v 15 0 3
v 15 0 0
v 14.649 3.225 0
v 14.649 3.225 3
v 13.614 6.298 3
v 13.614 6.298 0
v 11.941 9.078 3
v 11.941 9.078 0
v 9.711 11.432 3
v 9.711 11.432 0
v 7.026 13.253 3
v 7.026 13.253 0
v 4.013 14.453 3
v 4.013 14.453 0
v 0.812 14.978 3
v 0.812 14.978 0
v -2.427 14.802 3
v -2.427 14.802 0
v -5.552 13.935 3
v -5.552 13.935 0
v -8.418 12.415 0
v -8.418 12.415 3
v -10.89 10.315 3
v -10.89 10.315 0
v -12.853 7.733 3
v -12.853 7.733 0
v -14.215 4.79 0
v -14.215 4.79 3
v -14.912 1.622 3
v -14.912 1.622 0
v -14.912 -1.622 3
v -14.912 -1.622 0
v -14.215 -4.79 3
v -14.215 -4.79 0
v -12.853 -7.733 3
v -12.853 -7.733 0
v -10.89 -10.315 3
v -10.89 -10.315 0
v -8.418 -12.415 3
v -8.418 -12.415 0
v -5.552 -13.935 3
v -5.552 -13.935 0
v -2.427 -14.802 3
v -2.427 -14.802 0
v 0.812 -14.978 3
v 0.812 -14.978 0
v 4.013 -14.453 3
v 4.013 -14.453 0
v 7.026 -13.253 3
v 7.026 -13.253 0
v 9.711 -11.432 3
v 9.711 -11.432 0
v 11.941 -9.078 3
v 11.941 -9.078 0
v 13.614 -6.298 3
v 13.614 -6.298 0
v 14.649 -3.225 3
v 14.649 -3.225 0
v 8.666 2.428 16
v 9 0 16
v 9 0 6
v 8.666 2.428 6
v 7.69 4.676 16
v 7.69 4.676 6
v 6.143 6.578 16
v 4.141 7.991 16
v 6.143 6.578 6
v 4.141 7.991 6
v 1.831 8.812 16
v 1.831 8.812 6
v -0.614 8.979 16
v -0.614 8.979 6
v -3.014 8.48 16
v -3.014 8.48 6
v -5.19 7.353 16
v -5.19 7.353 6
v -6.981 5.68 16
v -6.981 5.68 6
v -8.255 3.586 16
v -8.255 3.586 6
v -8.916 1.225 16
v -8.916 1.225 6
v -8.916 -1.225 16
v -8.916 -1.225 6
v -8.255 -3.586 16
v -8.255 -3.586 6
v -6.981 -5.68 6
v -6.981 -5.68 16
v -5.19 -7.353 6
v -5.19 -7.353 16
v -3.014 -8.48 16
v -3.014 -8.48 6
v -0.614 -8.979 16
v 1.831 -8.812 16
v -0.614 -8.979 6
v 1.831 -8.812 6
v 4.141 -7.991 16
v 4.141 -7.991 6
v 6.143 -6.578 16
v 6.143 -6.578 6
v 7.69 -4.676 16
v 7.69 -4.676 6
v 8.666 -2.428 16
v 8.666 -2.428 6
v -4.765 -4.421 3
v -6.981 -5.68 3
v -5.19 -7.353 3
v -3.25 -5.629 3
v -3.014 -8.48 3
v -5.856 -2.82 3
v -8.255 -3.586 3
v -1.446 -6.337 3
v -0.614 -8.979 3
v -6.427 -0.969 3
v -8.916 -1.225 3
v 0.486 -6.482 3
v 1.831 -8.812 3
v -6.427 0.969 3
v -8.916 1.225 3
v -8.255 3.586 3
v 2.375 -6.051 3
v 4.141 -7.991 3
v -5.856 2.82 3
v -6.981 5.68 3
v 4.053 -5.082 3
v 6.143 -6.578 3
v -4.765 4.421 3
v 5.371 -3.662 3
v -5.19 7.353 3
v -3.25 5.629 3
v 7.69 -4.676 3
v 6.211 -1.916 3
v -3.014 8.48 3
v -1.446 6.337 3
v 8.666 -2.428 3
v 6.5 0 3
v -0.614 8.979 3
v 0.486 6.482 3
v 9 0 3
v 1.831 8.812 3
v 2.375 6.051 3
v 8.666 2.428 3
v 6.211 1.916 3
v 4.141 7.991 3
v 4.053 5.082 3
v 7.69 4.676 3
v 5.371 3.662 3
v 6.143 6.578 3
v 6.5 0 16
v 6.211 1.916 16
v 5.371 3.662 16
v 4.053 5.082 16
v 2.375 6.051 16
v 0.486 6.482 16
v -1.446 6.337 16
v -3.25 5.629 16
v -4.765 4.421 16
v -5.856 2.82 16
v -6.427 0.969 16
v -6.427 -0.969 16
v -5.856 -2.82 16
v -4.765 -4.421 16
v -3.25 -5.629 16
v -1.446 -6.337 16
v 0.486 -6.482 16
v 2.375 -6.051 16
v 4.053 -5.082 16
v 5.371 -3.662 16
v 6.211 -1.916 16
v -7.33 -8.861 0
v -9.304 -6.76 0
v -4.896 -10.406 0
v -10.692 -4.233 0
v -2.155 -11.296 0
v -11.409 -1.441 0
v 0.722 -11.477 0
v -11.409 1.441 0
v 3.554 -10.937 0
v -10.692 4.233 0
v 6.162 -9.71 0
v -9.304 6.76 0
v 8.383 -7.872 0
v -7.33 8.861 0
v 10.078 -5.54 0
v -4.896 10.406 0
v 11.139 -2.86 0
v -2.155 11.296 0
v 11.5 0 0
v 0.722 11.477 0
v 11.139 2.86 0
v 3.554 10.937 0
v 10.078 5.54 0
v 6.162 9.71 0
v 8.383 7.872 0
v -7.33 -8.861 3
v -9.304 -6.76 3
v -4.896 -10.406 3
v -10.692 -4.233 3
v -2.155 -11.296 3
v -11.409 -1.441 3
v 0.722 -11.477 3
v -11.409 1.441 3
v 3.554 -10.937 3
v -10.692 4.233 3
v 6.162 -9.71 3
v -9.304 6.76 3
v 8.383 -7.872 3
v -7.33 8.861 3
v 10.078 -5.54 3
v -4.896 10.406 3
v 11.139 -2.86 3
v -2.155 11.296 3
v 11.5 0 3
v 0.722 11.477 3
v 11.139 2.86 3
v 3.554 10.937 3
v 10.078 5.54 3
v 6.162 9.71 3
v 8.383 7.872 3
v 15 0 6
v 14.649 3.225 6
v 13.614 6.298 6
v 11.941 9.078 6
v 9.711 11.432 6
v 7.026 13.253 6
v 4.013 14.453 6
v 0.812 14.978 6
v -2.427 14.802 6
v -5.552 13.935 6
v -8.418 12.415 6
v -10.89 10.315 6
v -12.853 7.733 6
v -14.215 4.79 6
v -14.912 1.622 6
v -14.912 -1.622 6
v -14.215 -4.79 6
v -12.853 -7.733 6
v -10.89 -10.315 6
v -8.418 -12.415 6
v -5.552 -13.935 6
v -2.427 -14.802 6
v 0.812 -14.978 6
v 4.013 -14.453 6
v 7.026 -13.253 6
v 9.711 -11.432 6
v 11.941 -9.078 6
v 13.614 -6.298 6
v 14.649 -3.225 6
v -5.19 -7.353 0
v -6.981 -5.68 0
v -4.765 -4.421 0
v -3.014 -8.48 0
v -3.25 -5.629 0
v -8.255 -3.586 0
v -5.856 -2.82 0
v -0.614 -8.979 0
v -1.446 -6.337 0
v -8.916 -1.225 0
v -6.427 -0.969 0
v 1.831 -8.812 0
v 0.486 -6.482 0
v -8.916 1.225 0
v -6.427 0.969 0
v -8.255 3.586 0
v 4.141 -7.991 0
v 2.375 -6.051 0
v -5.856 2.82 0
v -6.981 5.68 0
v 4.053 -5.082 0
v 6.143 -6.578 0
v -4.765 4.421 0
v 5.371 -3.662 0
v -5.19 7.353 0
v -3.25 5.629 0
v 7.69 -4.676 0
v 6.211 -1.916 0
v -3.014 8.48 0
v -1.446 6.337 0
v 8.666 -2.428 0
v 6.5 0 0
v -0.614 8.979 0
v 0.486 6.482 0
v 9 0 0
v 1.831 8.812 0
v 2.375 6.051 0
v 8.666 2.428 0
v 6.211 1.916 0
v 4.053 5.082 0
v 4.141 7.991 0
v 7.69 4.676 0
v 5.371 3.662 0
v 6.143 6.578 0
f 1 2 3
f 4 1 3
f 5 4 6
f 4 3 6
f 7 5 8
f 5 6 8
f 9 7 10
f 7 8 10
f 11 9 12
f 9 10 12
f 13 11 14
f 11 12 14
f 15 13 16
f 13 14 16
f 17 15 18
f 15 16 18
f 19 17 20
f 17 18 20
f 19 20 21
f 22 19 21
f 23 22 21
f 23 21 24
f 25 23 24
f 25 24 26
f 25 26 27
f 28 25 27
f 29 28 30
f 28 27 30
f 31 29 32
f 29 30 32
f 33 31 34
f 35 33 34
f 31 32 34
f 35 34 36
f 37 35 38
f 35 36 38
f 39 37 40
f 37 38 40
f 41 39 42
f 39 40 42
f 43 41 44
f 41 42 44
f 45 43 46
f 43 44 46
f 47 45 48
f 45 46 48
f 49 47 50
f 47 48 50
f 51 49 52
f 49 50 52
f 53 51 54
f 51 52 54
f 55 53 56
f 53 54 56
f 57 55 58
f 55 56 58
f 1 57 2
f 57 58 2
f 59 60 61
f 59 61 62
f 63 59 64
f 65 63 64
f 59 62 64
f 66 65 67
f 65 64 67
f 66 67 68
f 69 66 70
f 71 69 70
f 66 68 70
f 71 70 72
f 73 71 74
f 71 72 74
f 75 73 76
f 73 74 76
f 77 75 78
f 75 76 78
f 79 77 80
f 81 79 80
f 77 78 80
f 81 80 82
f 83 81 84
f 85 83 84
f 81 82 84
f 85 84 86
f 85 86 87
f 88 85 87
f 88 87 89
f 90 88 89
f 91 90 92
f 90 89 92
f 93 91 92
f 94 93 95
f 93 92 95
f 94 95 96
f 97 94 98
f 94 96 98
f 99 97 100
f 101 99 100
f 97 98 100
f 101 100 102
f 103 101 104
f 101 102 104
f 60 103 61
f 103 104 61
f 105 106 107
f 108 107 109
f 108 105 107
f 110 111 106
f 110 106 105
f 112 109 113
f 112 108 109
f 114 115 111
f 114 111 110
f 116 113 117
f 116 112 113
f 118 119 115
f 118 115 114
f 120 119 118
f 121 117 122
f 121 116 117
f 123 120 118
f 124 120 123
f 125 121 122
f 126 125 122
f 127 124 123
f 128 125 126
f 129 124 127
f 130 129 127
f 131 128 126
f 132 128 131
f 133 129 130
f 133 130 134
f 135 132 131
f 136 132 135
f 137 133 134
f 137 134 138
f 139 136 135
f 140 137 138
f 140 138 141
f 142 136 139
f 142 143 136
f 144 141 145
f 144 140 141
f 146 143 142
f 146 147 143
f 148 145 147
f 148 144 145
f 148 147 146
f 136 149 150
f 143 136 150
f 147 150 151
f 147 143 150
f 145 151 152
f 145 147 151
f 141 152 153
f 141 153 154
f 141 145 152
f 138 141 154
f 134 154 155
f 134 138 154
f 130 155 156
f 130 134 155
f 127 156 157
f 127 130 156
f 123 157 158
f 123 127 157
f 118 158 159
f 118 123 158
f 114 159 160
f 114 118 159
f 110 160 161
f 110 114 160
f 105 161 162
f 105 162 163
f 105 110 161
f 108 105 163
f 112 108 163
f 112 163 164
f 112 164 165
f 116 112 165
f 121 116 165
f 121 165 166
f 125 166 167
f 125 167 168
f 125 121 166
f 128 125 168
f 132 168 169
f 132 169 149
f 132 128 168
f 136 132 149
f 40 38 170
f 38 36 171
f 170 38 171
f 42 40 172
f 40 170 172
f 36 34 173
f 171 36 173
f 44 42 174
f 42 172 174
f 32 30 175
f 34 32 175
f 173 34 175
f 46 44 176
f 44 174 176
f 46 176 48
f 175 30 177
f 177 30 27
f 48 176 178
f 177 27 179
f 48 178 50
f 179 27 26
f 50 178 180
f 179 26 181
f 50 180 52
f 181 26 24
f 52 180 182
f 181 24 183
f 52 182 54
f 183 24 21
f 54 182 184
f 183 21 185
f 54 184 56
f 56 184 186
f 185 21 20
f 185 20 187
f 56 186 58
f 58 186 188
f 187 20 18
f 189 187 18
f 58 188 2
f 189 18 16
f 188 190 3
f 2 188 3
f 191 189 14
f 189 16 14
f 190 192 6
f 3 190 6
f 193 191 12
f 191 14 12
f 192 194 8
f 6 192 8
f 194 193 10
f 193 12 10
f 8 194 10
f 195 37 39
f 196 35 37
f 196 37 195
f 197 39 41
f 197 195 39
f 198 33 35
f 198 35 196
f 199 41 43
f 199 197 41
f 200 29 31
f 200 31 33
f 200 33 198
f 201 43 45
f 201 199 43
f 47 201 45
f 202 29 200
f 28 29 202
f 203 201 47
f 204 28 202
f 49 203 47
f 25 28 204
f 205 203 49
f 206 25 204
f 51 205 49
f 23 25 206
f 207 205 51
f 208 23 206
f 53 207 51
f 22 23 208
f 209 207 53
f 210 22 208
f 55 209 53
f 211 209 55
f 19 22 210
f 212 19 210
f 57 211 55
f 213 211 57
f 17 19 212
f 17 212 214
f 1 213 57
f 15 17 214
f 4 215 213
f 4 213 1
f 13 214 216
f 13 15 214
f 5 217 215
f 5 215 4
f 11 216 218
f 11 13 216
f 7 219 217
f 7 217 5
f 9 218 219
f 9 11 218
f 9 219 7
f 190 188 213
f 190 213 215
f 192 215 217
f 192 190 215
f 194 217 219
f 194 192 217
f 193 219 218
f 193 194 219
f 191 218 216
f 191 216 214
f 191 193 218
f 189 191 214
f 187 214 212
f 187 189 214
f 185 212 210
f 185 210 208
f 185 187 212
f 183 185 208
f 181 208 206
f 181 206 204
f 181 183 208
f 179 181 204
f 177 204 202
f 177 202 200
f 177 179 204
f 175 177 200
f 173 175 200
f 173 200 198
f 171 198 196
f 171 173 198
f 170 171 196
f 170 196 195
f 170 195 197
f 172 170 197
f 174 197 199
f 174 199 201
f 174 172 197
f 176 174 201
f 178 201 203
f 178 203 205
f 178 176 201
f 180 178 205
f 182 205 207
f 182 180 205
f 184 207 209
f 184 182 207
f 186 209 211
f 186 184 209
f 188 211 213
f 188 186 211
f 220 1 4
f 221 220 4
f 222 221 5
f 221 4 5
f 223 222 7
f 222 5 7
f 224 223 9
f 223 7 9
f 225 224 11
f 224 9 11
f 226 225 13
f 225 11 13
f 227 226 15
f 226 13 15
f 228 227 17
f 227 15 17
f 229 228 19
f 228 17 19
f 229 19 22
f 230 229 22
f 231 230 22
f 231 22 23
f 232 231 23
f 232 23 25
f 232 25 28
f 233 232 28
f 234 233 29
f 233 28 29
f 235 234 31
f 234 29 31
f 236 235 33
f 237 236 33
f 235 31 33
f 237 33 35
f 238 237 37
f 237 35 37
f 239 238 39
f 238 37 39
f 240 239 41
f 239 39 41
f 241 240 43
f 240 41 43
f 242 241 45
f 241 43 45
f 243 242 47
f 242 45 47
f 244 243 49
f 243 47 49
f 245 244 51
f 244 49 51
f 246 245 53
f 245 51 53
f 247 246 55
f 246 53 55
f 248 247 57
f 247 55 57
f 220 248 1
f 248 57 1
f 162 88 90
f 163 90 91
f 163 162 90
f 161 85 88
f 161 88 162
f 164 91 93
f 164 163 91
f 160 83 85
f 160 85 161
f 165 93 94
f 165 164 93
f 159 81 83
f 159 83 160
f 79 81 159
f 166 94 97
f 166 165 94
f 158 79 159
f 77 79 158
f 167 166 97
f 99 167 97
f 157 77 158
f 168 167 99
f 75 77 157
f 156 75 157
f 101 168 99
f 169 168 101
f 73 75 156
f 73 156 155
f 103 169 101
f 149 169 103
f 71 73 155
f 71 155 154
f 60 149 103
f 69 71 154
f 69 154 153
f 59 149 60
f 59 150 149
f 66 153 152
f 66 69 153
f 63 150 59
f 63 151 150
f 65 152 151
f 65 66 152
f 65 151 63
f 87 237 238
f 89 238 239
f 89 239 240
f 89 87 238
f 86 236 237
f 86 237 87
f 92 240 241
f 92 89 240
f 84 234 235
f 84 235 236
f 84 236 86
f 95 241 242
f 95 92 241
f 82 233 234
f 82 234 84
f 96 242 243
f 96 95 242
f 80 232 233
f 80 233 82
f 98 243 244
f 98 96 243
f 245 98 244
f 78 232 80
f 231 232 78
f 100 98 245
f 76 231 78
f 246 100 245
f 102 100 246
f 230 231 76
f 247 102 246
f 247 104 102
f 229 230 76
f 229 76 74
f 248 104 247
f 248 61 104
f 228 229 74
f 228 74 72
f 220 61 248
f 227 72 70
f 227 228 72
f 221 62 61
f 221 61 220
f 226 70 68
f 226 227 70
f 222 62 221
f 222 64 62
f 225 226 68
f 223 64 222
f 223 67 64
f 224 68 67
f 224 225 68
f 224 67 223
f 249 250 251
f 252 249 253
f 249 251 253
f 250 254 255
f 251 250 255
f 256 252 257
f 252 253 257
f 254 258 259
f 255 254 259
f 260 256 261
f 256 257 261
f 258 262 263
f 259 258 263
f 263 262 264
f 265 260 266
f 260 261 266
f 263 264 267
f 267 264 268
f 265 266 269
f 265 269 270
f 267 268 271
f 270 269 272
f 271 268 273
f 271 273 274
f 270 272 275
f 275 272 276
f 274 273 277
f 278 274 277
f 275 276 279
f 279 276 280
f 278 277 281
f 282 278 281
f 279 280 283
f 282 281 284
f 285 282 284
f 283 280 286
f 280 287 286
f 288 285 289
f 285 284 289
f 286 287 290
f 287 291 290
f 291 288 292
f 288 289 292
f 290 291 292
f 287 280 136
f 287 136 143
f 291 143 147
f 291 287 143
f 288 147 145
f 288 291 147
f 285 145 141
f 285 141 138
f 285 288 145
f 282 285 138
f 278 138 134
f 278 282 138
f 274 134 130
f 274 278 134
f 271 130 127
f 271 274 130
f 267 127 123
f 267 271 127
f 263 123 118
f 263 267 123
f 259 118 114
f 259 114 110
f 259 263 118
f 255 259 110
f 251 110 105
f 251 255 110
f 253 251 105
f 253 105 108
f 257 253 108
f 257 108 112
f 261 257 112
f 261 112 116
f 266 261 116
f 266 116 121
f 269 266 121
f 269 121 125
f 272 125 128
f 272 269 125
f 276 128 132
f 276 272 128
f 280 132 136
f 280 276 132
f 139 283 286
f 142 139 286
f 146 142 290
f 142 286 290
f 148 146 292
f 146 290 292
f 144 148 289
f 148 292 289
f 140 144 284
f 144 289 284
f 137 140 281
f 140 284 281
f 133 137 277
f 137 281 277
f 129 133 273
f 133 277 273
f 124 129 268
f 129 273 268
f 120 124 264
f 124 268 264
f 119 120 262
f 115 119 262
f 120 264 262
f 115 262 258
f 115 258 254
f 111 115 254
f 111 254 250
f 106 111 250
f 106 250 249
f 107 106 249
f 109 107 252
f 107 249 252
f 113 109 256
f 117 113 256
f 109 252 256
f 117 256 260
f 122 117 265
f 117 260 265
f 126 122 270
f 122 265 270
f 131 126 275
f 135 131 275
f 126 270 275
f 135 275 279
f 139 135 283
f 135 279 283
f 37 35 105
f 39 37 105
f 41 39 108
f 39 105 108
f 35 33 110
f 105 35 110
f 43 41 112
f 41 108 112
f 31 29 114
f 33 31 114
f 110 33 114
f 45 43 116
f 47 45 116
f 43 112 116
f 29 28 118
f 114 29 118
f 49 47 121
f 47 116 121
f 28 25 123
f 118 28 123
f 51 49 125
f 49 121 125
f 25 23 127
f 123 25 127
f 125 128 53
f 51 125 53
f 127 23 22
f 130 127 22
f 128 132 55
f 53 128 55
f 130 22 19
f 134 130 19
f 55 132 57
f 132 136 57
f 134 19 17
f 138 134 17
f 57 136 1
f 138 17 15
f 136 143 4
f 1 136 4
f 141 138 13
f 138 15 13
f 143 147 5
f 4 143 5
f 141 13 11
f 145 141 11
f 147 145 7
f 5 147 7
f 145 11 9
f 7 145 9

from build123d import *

# Parameters (mm, degrees)
F0_R     = 15
F0_R_2   = 11.5
F1_DEPTH = 3
F0_R_3   = 9
F0_R_4   = 6.5
F2_R     = 15
F2_R_2   = 11.5
F2_R_3   = 6.5
F3_DEPTH = 3
F4_R     = 9
F4_R_2   = 6.5
F5_DEPTH = 10


# Not quite as in the source:
# - a feature names something its author has since deleted; it is built from what else it names


with BuildPart() as f1:
    # F0 (on Top) → F1 (new body)
    with BuildSketch(Plane.XY):
        Circle(F0_R)
        Circle(F0_R_2, mode=Mode.SUBTRACT)
    extrude(amount=F1_DEPTH)


with BuildPart() as f1b:
    # F0 (on Top) → F1, piece 2 (new body)
    with BuildSketch(Plane.XY):
        Circle(F0_R_3)
        Circle(F0_R_4, mode=Mode.SUBTRACT)
    extrude(amount=F1_DEPTH)


with BuildPart() as f3:
    # F2 (on face) → F3 (new body)
    with BuildSketch(Plane.XY.offset(3)):
        Circle(F2_R)
        Circle(F2_R_2, mode=Mode.SUBTRACT)
        Circle(F2_R_2)
        Circle(F2_R_3, mode=Mode.SUBTRACT)
    extrude(amount=F3_DEPTH)

    # F4 (on face) → F5 (join)
    with BuildSketch(Plane.XY.offset(6)):
        Circle(F4_R)
        Circle(F4_R_2, mode=Mode.SUBTRACT)
    extrude(amount=F5_DEPTH)


solid = Compound([f1.part, f1b.part, f3.part])
